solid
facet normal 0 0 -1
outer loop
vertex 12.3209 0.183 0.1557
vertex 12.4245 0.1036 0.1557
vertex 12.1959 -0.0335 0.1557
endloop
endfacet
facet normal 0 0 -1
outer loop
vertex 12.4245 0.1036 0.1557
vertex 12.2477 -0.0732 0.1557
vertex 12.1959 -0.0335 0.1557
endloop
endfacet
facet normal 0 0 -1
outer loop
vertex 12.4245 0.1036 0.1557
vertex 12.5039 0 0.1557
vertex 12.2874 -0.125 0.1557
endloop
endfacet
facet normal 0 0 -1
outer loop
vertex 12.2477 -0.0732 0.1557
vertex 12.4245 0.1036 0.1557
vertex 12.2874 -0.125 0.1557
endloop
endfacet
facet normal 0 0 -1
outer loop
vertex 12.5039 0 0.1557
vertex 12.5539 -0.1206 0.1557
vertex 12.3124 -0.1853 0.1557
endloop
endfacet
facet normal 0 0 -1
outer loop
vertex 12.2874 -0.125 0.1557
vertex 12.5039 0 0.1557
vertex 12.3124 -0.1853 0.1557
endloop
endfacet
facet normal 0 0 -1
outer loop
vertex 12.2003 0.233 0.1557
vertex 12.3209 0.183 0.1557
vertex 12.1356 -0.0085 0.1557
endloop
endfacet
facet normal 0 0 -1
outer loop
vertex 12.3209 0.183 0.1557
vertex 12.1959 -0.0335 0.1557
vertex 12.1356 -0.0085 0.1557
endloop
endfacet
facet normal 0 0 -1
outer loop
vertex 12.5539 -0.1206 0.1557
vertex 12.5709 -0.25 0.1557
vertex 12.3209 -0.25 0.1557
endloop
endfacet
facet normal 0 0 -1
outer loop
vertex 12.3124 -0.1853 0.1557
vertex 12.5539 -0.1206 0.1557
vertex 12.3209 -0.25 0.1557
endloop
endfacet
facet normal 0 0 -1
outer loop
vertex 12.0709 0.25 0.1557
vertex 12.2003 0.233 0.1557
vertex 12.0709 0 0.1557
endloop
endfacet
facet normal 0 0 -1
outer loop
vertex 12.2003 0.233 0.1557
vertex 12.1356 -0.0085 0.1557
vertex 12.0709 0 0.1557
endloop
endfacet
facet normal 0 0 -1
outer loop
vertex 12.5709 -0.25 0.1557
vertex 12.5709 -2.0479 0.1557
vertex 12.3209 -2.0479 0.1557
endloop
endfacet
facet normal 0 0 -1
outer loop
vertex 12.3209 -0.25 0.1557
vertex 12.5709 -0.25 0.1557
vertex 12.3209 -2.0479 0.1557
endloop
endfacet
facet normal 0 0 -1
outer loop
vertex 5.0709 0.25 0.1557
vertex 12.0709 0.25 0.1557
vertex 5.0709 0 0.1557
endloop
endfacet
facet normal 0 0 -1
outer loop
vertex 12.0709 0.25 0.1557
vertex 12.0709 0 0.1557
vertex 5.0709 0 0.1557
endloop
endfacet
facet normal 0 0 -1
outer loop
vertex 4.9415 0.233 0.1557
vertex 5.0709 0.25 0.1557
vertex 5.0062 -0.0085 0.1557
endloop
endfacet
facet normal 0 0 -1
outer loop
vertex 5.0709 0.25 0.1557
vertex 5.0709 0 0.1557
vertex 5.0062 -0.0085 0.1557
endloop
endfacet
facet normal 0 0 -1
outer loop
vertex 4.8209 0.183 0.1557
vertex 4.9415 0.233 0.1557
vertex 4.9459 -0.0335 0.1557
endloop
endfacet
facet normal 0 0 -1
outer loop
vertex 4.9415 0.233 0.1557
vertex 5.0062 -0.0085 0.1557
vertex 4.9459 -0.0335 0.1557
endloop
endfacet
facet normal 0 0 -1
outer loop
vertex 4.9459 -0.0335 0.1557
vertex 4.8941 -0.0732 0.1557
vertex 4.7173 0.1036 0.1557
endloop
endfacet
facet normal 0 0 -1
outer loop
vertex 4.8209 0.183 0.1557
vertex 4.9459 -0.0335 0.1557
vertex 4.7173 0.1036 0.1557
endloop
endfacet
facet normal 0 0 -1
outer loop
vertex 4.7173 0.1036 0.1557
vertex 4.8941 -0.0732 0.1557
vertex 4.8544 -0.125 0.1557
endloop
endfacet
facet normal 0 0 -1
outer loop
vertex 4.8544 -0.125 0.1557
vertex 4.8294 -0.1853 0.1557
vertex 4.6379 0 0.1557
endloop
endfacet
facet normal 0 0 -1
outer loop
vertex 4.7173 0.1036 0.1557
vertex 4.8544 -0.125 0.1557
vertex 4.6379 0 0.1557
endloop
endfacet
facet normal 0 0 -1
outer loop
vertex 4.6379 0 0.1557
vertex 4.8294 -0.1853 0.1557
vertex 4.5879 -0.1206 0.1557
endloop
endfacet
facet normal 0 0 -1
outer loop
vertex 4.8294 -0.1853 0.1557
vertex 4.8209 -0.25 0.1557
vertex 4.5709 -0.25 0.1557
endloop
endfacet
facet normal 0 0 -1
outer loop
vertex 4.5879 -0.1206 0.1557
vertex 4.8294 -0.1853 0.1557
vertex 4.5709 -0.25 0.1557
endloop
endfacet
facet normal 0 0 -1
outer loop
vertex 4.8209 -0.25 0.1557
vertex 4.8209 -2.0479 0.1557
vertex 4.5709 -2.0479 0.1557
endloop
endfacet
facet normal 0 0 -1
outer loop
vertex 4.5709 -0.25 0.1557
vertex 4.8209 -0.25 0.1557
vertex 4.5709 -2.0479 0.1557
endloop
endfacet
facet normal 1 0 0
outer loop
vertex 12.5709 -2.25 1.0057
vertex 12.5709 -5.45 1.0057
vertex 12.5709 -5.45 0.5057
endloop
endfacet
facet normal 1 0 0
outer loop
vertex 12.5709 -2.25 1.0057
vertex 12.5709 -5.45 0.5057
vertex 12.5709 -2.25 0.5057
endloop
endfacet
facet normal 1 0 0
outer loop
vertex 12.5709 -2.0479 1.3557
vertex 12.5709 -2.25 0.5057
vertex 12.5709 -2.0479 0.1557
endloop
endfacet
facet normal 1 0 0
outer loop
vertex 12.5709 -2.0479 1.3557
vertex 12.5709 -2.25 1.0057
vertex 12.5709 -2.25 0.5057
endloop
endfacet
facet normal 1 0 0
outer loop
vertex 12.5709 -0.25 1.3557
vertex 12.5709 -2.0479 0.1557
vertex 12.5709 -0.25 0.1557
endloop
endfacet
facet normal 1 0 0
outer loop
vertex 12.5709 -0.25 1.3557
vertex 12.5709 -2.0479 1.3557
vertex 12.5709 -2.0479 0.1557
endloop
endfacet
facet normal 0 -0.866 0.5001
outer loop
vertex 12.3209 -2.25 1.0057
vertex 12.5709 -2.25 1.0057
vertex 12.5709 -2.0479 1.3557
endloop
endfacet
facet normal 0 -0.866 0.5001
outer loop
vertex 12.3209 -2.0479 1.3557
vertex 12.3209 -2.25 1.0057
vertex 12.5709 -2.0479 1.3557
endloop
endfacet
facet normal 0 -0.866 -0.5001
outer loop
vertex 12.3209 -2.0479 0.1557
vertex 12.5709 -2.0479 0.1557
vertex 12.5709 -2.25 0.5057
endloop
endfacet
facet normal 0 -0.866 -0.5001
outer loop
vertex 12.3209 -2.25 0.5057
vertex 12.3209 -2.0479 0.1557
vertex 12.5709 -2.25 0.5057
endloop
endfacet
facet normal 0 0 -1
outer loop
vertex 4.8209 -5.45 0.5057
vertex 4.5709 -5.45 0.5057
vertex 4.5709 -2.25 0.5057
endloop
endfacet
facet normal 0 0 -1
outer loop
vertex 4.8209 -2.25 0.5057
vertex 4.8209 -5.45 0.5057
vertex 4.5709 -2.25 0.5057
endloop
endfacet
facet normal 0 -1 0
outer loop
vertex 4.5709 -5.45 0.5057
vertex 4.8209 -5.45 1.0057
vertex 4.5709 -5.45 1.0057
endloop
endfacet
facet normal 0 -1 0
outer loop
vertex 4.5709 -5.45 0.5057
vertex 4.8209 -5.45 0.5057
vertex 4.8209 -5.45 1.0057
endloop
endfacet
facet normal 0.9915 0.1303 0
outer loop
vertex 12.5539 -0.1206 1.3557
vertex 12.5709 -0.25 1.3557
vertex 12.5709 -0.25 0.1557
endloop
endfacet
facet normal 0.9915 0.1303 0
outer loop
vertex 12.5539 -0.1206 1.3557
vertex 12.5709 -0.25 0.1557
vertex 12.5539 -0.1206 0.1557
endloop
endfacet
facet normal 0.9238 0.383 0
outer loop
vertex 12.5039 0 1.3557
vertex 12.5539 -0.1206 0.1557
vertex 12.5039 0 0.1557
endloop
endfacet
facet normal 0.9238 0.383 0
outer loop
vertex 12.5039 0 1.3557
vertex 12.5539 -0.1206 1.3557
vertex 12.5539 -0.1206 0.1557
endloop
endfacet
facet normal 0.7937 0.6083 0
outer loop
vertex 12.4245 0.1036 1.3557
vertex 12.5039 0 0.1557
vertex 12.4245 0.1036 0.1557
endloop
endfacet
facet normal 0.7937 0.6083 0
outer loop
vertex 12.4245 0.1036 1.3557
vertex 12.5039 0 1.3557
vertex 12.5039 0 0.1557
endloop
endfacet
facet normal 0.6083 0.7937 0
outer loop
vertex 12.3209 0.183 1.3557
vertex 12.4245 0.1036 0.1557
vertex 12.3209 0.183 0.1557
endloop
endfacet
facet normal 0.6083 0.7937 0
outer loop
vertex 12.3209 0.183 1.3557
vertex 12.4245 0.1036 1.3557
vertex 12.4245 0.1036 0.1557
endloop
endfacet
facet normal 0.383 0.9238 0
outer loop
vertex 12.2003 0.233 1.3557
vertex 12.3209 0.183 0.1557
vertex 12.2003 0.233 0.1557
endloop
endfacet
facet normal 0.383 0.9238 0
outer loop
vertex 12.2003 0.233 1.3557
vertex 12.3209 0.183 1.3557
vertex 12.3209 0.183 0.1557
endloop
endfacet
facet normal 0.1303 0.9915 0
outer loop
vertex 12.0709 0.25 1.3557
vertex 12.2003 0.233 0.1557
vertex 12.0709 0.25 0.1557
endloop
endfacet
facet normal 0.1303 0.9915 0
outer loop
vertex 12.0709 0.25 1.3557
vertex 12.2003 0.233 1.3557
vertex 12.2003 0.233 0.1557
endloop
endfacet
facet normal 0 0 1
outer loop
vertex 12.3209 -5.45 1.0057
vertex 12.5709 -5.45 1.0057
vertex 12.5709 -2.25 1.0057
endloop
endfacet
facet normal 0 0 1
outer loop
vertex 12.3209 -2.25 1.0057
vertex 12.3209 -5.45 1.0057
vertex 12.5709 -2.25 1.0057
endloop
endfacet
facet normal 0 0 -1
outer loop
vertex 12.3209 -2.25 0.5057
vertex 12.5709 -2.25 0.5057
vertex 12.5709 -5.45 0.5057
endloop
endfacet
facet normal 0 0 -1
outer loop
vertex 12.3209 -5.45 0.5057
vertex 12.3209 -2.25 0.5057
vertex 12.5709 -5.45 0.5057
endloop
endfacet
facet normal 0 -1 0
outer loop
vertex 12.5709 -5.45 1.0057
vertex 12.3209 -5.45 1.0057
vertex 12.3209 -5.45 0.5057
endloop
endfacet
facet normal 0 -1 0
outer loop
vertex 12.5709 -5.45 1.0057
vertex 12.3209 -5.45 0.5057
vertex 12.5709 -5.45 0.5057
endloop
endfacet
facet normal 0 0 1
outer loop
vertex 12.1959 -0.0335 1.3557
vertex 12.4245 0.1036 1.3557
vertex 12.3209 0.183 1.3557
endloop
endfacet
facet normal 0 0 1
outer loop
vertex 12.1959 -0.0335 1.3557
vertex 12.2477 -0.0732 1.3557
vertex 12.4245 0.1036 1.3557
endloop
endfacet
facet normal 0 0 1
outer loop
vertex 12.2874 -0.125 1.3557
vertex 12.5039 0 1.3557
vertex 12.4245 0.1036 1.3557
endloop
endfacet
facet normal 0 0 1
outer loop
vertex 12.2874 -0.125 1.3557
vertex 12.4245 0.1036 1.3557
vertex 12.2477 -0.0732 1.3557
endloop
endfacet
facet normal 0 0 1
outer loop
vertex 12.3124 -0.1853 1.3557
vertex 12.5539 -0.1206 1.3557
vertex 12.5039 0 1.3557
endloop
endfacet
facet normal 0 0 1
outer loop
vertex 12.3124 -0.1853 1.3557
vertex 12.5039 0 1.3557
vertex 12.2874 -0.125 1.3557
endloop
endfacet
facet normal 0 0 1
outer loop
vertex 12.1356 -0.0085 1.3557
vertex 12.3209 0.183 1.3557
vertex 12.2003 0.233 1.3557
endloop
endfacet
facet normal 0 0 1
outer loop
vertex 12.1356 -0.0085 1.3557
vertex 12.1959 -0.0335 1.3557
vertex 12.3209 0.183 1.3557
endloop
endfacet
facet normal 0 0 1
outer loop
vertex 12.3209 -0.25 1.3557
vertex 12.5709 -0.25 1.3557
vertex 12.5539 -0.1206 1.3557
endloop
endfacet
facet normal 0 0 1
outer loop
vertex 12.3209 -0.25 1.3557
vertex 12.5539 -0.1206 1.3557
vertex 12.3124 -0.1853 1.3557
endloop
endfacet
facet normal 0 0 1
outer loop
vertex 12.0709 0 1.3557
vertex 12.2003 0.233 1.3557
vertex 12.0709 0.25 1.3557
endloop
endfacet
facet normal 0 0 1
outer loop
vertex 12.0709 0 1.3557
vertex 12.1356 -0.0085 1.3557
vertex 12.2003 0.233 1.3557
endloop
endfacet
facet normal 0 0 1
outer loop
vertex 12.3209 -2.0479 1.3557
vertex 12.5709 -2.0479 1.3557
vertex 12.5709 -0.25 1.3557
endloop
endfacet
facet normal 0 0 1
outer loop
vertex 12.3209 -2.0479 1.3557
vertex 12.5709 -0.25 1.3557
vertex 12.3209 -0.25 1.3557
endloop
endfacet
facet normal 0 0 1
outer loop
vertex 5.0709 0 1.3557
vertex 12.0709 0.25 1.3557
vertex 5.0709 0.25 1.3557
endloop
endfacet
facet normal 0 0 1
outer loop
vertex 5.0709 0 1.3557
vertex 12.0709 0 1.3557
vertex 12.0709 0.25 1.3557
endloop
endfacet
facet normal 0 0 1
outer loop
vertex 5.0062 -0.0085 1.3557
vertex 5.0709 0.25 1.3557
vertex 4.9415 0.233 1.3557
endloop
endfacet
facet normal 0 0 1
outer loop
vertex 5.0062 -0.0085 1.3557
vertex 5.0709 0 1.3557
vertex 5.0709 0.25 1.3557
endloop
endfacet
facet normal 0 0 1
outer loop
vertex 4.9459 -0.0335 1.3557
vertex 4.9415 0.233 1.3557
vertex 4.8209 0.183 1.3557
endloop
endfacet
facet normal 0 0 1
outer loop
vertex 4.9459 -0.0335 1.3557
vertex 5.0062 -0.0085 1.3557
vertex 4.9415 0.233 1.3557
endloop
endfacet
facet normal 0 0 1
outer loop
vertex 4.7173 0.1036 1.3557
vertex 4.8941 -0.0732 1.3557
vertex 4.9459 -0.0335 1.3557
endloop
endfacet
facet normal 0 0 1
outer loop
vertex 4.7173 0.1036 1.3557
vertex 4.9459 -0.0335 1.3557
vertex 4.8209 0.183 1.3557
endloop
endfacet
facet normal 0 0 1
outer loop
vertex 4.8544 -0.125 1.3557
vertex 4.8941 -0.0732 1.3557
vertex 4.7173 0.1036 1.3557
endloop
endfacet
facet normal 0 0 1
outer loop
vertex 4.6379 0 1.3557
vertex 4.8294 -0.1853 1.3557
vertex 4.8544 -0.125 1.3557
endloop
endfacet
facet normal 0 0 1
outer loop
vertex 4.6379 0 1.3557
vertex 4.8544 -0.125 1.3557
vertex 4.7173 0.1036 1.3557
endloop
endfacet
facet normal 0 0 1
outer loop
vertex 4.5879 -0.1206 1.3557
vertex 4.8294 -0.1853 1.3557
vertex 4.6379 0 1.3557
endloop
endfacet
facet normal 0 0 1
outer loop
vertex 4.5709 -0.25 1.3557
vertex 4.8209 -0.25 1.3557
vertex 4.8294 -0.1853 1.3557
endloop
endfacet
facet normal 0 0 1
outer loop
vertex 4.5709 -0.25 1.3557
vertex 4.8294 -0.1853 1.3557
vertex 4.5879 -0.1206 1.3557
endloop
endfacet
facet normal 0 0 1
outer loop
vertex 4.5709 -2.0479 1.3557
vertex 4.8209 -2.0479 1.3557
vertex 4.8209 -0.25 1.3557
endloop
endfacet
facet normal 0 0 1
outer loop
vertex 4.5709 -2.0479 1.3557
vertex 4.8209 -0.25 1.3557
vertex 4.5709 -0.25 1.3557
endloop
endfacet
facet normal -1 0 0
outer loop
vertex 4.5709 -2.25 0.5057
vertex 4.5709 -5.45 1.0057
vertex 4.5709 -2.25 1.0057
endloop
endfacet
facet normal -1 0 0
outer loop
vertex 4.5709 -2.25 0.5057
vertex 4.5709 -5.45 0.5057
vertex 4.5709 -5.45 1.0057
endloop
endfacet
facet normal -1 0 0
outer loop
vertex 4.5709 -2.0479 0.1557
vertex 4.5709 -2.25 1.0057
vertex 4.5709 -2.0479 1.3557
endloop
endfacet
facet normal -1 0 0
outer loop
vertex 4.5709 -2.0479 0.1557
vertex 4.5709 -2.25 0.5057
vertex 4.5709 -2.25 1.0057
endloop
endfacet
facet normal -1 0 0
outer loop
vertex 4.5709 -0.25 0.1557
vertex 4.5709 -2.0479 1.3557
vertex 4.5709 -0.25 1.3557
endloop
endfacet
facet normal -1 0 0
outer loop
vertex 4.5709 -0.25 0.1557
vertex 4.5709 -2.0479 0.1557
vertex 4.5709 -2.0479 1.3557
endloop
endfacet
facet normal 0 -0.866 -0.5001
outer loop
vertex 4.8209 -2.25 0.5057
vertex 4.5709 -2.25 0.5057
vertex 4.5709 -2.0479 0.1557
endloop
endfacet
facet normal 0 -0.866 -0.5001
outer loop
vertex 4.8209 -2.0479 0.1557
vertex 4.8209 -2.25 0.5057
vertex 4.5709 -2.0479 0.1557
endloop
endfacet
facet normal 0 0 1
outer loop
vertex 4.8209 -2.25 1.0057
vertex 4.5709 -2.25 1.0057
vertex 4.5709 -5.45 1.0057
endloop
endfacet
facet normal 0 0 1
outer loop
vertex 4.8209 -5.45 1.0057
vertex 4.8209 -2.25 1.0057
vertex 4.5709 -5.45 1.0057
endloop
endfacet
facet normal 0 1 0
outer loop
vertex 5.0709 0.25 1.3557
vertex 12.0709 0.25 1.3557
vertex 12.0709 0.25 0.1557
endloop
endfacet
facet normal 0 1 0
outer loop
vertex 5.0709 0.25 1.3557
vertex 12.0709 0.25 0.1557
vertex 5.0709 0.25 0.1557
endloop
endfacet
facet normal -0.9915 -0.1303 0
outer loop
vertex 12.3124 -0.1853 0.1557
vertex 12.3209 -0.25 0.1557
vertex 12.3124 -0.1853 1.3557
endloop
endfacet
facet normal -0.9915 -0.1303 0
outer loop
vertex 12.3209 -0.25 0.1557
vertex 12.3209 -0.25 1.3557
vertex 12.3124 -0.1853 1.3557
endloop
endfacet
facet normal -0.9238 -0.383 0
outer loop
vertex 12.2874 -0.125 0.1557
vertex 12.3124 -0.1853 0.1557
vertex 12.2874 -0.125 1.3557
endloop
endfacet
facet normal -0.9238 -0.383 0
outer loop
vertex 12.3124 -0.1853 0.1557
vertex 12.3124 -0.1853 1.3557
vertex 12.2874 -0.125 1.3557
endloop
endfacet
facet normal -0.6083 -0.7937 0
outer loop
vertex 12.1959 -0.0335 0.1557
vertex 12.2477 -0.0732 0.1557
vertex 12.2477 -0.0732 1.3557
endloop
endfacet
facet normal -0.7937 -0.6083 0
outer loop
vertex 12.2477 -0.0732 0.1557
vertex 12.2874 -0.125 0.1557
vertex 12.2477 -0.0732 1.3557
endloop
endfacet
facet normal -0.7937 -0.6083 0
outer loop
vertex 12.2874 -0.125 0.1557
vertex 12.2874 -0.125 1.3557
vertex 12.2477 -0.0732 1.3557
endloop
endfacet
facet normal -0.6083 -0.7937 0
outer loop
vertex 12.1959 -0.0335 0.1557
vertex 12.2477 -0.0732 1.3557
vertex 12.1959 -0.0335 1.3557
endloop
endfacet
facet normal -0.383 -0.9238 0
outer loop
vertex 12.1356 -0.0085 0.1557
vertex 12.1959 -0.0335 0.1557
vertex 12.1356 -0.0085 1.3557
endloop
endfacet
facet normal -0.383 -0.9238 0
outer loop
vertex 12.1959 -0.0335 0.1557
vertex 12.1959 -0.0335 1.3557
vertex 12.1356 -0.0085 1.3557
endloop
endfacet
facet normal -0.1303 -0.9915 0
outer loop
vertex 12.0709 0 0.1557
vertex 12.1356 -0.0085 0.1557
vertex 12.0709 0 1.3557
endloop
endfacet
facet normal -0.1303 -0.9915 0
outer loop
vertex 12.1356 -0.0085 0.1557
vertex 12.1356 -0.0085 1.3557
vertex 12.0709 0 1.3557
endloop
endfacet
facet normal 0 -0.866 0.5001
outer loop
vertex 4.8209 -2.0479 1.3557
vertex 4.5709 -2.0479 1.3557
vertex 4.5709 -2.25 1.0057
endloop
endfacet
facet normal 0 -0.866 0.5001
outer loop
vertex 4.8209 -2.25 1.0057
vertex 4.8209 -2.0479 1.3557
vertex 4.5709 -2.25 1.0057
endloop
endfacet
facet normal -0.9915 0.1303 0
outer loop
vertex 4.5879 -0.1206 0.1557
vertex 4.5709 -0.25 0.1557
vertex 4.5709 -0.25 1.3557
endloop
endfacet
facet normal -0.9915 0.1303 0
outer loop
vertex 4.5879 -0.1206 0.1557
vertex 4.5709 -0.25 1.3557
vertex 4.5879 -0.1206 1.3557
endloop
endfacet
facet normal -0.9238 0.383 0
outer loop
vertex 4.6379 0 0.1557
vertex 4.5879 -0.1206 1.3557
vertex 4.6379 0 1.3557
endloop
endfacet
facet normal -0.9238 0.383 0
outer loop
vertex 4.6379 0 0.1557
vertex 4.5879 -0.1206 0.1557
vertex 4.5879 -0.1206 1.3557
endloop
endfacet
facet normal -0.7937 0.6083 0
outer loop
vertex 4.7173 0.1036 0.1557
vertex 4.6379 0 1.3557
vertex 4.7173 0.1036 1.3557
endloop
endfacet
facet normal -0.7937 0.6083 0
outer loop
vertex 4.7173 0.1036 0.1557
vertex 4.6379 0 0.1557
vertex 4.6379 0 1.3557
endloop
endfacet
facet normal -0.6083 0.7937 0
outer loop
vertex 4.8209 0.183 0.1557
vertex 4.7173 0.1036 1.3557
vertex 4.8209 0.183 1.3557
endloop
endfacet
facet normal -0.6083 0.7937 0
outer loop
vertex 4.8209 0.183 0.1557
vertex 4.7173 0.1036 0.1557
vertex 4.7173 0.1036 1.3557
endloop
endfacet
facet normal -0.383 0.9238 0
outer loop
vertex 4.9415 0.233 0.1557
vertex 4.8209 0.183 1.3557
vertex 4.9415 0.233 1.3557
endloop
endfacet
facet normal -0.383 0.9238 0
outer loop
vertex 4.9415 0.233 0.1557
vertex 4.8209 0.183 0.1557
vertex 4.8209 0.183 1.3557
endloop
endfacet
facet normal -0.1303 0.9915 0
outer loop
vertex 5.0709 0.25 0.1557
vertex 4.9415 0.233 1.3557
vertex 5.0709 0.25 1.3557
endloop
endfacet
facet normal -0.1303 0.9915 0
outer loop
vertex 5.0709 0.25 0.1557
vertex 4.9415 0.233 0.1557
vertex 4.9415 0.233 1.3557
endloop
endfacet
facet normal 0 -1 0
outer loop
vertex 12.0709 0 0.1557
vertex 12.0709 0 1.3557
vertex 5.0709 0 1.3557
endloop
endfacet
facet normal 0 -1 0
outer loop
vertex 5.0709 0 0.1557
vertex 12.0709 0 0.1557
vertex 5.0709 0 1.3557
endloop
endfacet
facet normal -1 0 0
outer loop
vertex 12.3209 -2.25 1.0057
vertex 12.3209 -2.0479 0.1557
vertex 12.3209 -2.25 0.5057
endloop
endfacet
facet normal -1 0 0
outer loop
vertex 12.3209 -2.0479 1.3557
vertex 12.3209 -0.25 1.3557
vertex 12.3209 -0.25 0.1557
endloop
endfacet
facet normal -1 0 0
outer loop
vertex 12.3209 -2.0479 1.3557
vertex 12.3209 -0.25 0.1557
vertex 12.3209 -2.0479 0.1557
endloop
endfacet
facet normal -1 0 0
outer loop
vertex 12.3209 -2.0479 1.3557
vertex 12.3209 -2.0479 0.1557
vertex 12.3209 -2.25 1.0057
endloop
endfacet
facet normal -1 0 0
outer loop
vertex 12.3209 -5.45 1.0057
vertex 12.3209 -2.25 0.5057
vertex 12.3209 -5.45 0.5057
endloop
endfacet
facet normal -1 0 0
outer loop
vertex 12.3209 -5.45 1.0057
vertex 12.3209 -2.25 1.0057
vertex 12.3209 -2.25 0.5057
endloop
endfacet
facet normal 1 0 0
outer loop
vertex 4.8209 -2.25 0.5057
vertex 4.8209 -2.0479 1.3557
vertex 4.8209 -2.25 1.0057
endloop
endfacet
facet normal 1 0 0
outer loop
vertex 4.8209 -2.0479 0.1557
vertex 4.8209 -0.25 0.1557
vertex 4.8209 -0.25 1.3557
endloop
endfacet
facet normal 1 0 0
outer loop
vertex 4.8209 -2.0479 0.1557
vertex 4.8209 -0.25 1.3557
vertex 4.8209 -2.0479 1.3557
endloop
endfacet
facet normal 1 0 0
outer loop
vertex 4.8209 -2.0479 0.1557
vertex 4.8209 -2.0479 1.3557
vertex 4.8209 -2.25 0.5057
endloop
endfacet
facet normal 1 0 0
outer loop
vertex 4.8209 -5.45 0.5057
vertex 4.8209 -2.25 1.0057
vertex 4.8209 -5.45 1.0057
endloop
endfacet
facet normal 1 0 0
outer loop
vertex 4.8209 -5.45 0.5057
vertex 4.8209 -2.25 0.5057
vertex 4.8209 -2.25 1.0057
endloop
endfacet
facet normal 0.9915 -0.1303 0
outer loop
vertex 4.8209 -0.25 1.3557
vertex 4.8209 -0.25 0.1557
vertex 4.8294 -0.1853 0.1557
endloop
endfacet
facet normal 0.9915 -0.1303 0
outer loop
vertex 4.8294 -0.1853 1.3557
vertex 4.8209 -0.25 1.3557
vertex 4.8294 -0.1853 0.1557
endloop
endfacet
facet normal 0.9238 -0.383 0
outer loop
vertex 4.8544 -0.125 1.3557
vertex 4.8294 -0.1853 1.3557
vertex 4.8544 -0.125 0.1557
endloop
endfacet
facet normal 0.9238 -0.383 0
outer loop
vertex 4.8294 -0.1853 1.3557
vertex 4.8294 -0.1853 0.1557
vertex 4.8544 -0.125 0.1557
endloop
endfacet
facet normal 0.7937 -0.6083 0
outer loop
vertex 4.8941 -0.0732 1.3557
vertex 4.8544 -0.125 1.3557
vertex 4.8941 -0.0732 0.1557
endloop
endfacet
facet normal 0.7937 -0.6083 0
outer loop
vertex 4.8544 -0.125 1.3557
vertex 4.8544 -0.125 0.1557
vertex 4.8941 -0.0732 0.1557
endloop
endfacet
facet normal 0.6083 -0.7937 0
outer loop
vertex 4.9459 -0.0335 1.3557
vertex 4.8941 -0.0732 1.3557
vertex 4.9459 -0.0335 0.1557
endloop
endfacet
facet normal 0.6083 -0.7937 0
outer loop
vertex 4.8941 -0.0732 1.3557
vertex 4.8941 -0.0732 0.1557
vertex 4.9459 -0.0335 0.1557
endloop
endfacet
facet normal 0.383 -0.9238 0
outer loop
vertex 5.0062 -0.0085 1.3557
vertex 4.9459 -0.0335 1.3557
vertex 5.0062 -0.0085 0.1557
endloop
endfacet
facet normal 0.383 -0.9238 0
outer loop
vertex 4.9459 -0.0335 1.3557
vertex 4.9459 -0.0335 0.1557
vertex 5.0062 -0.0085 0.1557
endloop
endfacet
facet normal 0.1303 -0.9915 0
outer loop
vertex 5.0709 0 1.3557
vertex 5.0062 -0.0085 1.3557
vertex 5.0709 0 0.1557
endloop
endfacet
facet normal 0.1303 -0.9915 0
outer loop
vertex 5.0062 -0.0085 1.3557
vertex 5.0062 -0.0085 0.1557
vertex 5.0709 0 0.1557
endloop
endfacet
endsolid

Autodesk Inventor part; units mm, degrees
ref_plane "YZ Plane" through (0, 0, 0) normal (1, 0, 0) x (0, 1, 0)
ref_plane "XZ Plane" through (0, 0, 0) normal (0, 1, 0) x (-1, 0, 0)
ref_plane "XY Plane" through (0, 0, 0) normal (0, 0, 1) x (1, 0, 0)
sketch "Sketch1" plane through (0, 0, 0) normal (0, 1, 0) x (-1, 0, 0)
  line L0 (-4.5709, 0.1557) -> (-12.5709, 0.1557)
  line L1 (-12.5709, 0.1557) -> (-12.5709, 1.3557)
  line L2 (-12.5709, 1.3557) -> (-4.5709, 1.3557)
  line L3 (-4.5709, 1.3557) -> (-4.5709, 0.1557)
  dimension "d27" = 8
  dimension "d28" = 1.3
extrude "Plate4" add sketch "Sketch1" along normal blind 0.25
sketch "Sketch5" plane through (12.3209, 0.25, 1.3557) normal (1, 0, 0) x (0, 1, 0)
  line L0 (0, -1.2) -> (0, 0)
  line L1 (0, 0) -> (-5.7, 0)
  line L2 (-5.7, 0) -> (-5.7, -1.2)
  line L3 (-5.7, -1.2) -> (0, -1.2)
edge flange "Flange4" height 5.7 angle 90 thickness 0.25 bend radius 0.25 thickness toward (1, 0, 0) relief tear relief width 0.25 relief depth 0.125 corner gap 0.25 corner form 0 edges at (12.5709, 0, 0.7557) (4.5709, 0, 0.7557) wall of the first edge with corners at (12.3209, 0.25, 0.1557) (12.3209, 0.25, 1.3557) (12.3209, -5.45, 1.3557) (12.3209, -5.45, 0.1557)
bend "Bend4"
corner "Corner4"
sketch "Sketch6" plane through (12.5709, -5.45, 1.3557) normal (1, 0, 0) x (0, 0, -1)
  line L0 (1.2, 0) -> (0, 0) projected
  line L1 (0.6, 0) -> (0.6, 5.2) construction
  line L2 (1.2, 5.2) -> (0, 5.2) projected
  line L3 (1.2, 3.4021) -> (0.85, 3.2)
  line L4 (0.85, 3.2) -> (0.85, 0)
  line L5 (1.2, 0) -> (0.85, 0)
  line L6 (1.2, 5.2) -> (1.2, 0) projected
  line L7 (1.2, 3.4021) -> (1.2, 0)
  line L8 (0, 5.7) -> (1.2, 5.7) projected
  point P0 (1.3557, 5.45)
  dimension "d52" = 3.2
  dimension "d54" = 0.25
  dimension "d56" = 2.5
extrude "Cut1" cut sketch "Sketch6" against normal blind 0.25
ref_plane "Work Plane1" through (12.5709, -0.25, 0.7557) normal (0, 0, -1) x (-1, 0, 0)
ref_plane "Work Plane2" through (8.5709, -5.45, 1.3557) normal (1, 0, 0) x (0, 0, -1)
mirror "Mirror1" about plane through (12.5709, -0.25, 0.7557) normal (0, 0, -1) of "Cut1"
mirror "Mirror2" about plane through (8.5709, -5.45, 1.3557) normal (1, 0, 0) of "Cut1"
mirror "Mirror3" about plane through (8.5709, -5.45, 1.3557) normal (1, 0, 0) of "Cut1", "Mirror1"
equation "\"d27\" = atmegaPinBaseWidth"
equation "\"d28\" = atmegaPinWidth1"
equation "\"d52\" = atmegaSeatingPlaneDistance"
equation "\"d54\" = 0.5 * atmegaPinWidth2"
equation "\"d50\" = Thickness"
equation "\"d29\" = Thickness"
equation "\"d40\" = BendReliefWidth"
equation "\"d41\" = BendReliefDepth"
equation "\"d42\" = MinimumRemnant"
equation "\"d43\" = TransitionRadius"
equation "\"d44\" = atmegaPinLenght"
equation "\"d46\" = BendRadius"
equation "\"d47\" = CornerReliefSize"
equation "\"d48\" = GapSize"
equation "\"d49\" = JacobiRadiusSize"
equation "\"BendRadius\" = Thickness"
equation "\"BendReliefWidth\" = Thickness"
equation "\"BendReliefDepth\" = 0.5 * Thickness"
equation "\"CornerReliefSize\" = 4 * Thickness"
equation "\"MinimumRemnant\" = 2 * Thickness"
equation "\"TransitionRadius\" = BendRadius"
equation "\"JacobiRadiusSize\" = BendRadius"
equation "\"GapSize\" = Thickness"
equation "\"atmegaPinThickness\" = 0.3"
equation "\"atmegaPinWidth1\" = 1.3"
equation "\"atmegaPinWidth2\" = 0.5"
equation "\"atmegaEndPinWidth\" = 0.9"
equation "\"atmegaPinBendAngle\" = 80deg"
equation "\"atmegaPinBaseWidth\" = 8"
equation "\"atmegaSeatingPlaneDistance\" = 3.2"
equation "\"Thickness\" = 0.25"
equation "\"atmegaPinLenght\" = 5.7"
properties part number "atmega_pin"
